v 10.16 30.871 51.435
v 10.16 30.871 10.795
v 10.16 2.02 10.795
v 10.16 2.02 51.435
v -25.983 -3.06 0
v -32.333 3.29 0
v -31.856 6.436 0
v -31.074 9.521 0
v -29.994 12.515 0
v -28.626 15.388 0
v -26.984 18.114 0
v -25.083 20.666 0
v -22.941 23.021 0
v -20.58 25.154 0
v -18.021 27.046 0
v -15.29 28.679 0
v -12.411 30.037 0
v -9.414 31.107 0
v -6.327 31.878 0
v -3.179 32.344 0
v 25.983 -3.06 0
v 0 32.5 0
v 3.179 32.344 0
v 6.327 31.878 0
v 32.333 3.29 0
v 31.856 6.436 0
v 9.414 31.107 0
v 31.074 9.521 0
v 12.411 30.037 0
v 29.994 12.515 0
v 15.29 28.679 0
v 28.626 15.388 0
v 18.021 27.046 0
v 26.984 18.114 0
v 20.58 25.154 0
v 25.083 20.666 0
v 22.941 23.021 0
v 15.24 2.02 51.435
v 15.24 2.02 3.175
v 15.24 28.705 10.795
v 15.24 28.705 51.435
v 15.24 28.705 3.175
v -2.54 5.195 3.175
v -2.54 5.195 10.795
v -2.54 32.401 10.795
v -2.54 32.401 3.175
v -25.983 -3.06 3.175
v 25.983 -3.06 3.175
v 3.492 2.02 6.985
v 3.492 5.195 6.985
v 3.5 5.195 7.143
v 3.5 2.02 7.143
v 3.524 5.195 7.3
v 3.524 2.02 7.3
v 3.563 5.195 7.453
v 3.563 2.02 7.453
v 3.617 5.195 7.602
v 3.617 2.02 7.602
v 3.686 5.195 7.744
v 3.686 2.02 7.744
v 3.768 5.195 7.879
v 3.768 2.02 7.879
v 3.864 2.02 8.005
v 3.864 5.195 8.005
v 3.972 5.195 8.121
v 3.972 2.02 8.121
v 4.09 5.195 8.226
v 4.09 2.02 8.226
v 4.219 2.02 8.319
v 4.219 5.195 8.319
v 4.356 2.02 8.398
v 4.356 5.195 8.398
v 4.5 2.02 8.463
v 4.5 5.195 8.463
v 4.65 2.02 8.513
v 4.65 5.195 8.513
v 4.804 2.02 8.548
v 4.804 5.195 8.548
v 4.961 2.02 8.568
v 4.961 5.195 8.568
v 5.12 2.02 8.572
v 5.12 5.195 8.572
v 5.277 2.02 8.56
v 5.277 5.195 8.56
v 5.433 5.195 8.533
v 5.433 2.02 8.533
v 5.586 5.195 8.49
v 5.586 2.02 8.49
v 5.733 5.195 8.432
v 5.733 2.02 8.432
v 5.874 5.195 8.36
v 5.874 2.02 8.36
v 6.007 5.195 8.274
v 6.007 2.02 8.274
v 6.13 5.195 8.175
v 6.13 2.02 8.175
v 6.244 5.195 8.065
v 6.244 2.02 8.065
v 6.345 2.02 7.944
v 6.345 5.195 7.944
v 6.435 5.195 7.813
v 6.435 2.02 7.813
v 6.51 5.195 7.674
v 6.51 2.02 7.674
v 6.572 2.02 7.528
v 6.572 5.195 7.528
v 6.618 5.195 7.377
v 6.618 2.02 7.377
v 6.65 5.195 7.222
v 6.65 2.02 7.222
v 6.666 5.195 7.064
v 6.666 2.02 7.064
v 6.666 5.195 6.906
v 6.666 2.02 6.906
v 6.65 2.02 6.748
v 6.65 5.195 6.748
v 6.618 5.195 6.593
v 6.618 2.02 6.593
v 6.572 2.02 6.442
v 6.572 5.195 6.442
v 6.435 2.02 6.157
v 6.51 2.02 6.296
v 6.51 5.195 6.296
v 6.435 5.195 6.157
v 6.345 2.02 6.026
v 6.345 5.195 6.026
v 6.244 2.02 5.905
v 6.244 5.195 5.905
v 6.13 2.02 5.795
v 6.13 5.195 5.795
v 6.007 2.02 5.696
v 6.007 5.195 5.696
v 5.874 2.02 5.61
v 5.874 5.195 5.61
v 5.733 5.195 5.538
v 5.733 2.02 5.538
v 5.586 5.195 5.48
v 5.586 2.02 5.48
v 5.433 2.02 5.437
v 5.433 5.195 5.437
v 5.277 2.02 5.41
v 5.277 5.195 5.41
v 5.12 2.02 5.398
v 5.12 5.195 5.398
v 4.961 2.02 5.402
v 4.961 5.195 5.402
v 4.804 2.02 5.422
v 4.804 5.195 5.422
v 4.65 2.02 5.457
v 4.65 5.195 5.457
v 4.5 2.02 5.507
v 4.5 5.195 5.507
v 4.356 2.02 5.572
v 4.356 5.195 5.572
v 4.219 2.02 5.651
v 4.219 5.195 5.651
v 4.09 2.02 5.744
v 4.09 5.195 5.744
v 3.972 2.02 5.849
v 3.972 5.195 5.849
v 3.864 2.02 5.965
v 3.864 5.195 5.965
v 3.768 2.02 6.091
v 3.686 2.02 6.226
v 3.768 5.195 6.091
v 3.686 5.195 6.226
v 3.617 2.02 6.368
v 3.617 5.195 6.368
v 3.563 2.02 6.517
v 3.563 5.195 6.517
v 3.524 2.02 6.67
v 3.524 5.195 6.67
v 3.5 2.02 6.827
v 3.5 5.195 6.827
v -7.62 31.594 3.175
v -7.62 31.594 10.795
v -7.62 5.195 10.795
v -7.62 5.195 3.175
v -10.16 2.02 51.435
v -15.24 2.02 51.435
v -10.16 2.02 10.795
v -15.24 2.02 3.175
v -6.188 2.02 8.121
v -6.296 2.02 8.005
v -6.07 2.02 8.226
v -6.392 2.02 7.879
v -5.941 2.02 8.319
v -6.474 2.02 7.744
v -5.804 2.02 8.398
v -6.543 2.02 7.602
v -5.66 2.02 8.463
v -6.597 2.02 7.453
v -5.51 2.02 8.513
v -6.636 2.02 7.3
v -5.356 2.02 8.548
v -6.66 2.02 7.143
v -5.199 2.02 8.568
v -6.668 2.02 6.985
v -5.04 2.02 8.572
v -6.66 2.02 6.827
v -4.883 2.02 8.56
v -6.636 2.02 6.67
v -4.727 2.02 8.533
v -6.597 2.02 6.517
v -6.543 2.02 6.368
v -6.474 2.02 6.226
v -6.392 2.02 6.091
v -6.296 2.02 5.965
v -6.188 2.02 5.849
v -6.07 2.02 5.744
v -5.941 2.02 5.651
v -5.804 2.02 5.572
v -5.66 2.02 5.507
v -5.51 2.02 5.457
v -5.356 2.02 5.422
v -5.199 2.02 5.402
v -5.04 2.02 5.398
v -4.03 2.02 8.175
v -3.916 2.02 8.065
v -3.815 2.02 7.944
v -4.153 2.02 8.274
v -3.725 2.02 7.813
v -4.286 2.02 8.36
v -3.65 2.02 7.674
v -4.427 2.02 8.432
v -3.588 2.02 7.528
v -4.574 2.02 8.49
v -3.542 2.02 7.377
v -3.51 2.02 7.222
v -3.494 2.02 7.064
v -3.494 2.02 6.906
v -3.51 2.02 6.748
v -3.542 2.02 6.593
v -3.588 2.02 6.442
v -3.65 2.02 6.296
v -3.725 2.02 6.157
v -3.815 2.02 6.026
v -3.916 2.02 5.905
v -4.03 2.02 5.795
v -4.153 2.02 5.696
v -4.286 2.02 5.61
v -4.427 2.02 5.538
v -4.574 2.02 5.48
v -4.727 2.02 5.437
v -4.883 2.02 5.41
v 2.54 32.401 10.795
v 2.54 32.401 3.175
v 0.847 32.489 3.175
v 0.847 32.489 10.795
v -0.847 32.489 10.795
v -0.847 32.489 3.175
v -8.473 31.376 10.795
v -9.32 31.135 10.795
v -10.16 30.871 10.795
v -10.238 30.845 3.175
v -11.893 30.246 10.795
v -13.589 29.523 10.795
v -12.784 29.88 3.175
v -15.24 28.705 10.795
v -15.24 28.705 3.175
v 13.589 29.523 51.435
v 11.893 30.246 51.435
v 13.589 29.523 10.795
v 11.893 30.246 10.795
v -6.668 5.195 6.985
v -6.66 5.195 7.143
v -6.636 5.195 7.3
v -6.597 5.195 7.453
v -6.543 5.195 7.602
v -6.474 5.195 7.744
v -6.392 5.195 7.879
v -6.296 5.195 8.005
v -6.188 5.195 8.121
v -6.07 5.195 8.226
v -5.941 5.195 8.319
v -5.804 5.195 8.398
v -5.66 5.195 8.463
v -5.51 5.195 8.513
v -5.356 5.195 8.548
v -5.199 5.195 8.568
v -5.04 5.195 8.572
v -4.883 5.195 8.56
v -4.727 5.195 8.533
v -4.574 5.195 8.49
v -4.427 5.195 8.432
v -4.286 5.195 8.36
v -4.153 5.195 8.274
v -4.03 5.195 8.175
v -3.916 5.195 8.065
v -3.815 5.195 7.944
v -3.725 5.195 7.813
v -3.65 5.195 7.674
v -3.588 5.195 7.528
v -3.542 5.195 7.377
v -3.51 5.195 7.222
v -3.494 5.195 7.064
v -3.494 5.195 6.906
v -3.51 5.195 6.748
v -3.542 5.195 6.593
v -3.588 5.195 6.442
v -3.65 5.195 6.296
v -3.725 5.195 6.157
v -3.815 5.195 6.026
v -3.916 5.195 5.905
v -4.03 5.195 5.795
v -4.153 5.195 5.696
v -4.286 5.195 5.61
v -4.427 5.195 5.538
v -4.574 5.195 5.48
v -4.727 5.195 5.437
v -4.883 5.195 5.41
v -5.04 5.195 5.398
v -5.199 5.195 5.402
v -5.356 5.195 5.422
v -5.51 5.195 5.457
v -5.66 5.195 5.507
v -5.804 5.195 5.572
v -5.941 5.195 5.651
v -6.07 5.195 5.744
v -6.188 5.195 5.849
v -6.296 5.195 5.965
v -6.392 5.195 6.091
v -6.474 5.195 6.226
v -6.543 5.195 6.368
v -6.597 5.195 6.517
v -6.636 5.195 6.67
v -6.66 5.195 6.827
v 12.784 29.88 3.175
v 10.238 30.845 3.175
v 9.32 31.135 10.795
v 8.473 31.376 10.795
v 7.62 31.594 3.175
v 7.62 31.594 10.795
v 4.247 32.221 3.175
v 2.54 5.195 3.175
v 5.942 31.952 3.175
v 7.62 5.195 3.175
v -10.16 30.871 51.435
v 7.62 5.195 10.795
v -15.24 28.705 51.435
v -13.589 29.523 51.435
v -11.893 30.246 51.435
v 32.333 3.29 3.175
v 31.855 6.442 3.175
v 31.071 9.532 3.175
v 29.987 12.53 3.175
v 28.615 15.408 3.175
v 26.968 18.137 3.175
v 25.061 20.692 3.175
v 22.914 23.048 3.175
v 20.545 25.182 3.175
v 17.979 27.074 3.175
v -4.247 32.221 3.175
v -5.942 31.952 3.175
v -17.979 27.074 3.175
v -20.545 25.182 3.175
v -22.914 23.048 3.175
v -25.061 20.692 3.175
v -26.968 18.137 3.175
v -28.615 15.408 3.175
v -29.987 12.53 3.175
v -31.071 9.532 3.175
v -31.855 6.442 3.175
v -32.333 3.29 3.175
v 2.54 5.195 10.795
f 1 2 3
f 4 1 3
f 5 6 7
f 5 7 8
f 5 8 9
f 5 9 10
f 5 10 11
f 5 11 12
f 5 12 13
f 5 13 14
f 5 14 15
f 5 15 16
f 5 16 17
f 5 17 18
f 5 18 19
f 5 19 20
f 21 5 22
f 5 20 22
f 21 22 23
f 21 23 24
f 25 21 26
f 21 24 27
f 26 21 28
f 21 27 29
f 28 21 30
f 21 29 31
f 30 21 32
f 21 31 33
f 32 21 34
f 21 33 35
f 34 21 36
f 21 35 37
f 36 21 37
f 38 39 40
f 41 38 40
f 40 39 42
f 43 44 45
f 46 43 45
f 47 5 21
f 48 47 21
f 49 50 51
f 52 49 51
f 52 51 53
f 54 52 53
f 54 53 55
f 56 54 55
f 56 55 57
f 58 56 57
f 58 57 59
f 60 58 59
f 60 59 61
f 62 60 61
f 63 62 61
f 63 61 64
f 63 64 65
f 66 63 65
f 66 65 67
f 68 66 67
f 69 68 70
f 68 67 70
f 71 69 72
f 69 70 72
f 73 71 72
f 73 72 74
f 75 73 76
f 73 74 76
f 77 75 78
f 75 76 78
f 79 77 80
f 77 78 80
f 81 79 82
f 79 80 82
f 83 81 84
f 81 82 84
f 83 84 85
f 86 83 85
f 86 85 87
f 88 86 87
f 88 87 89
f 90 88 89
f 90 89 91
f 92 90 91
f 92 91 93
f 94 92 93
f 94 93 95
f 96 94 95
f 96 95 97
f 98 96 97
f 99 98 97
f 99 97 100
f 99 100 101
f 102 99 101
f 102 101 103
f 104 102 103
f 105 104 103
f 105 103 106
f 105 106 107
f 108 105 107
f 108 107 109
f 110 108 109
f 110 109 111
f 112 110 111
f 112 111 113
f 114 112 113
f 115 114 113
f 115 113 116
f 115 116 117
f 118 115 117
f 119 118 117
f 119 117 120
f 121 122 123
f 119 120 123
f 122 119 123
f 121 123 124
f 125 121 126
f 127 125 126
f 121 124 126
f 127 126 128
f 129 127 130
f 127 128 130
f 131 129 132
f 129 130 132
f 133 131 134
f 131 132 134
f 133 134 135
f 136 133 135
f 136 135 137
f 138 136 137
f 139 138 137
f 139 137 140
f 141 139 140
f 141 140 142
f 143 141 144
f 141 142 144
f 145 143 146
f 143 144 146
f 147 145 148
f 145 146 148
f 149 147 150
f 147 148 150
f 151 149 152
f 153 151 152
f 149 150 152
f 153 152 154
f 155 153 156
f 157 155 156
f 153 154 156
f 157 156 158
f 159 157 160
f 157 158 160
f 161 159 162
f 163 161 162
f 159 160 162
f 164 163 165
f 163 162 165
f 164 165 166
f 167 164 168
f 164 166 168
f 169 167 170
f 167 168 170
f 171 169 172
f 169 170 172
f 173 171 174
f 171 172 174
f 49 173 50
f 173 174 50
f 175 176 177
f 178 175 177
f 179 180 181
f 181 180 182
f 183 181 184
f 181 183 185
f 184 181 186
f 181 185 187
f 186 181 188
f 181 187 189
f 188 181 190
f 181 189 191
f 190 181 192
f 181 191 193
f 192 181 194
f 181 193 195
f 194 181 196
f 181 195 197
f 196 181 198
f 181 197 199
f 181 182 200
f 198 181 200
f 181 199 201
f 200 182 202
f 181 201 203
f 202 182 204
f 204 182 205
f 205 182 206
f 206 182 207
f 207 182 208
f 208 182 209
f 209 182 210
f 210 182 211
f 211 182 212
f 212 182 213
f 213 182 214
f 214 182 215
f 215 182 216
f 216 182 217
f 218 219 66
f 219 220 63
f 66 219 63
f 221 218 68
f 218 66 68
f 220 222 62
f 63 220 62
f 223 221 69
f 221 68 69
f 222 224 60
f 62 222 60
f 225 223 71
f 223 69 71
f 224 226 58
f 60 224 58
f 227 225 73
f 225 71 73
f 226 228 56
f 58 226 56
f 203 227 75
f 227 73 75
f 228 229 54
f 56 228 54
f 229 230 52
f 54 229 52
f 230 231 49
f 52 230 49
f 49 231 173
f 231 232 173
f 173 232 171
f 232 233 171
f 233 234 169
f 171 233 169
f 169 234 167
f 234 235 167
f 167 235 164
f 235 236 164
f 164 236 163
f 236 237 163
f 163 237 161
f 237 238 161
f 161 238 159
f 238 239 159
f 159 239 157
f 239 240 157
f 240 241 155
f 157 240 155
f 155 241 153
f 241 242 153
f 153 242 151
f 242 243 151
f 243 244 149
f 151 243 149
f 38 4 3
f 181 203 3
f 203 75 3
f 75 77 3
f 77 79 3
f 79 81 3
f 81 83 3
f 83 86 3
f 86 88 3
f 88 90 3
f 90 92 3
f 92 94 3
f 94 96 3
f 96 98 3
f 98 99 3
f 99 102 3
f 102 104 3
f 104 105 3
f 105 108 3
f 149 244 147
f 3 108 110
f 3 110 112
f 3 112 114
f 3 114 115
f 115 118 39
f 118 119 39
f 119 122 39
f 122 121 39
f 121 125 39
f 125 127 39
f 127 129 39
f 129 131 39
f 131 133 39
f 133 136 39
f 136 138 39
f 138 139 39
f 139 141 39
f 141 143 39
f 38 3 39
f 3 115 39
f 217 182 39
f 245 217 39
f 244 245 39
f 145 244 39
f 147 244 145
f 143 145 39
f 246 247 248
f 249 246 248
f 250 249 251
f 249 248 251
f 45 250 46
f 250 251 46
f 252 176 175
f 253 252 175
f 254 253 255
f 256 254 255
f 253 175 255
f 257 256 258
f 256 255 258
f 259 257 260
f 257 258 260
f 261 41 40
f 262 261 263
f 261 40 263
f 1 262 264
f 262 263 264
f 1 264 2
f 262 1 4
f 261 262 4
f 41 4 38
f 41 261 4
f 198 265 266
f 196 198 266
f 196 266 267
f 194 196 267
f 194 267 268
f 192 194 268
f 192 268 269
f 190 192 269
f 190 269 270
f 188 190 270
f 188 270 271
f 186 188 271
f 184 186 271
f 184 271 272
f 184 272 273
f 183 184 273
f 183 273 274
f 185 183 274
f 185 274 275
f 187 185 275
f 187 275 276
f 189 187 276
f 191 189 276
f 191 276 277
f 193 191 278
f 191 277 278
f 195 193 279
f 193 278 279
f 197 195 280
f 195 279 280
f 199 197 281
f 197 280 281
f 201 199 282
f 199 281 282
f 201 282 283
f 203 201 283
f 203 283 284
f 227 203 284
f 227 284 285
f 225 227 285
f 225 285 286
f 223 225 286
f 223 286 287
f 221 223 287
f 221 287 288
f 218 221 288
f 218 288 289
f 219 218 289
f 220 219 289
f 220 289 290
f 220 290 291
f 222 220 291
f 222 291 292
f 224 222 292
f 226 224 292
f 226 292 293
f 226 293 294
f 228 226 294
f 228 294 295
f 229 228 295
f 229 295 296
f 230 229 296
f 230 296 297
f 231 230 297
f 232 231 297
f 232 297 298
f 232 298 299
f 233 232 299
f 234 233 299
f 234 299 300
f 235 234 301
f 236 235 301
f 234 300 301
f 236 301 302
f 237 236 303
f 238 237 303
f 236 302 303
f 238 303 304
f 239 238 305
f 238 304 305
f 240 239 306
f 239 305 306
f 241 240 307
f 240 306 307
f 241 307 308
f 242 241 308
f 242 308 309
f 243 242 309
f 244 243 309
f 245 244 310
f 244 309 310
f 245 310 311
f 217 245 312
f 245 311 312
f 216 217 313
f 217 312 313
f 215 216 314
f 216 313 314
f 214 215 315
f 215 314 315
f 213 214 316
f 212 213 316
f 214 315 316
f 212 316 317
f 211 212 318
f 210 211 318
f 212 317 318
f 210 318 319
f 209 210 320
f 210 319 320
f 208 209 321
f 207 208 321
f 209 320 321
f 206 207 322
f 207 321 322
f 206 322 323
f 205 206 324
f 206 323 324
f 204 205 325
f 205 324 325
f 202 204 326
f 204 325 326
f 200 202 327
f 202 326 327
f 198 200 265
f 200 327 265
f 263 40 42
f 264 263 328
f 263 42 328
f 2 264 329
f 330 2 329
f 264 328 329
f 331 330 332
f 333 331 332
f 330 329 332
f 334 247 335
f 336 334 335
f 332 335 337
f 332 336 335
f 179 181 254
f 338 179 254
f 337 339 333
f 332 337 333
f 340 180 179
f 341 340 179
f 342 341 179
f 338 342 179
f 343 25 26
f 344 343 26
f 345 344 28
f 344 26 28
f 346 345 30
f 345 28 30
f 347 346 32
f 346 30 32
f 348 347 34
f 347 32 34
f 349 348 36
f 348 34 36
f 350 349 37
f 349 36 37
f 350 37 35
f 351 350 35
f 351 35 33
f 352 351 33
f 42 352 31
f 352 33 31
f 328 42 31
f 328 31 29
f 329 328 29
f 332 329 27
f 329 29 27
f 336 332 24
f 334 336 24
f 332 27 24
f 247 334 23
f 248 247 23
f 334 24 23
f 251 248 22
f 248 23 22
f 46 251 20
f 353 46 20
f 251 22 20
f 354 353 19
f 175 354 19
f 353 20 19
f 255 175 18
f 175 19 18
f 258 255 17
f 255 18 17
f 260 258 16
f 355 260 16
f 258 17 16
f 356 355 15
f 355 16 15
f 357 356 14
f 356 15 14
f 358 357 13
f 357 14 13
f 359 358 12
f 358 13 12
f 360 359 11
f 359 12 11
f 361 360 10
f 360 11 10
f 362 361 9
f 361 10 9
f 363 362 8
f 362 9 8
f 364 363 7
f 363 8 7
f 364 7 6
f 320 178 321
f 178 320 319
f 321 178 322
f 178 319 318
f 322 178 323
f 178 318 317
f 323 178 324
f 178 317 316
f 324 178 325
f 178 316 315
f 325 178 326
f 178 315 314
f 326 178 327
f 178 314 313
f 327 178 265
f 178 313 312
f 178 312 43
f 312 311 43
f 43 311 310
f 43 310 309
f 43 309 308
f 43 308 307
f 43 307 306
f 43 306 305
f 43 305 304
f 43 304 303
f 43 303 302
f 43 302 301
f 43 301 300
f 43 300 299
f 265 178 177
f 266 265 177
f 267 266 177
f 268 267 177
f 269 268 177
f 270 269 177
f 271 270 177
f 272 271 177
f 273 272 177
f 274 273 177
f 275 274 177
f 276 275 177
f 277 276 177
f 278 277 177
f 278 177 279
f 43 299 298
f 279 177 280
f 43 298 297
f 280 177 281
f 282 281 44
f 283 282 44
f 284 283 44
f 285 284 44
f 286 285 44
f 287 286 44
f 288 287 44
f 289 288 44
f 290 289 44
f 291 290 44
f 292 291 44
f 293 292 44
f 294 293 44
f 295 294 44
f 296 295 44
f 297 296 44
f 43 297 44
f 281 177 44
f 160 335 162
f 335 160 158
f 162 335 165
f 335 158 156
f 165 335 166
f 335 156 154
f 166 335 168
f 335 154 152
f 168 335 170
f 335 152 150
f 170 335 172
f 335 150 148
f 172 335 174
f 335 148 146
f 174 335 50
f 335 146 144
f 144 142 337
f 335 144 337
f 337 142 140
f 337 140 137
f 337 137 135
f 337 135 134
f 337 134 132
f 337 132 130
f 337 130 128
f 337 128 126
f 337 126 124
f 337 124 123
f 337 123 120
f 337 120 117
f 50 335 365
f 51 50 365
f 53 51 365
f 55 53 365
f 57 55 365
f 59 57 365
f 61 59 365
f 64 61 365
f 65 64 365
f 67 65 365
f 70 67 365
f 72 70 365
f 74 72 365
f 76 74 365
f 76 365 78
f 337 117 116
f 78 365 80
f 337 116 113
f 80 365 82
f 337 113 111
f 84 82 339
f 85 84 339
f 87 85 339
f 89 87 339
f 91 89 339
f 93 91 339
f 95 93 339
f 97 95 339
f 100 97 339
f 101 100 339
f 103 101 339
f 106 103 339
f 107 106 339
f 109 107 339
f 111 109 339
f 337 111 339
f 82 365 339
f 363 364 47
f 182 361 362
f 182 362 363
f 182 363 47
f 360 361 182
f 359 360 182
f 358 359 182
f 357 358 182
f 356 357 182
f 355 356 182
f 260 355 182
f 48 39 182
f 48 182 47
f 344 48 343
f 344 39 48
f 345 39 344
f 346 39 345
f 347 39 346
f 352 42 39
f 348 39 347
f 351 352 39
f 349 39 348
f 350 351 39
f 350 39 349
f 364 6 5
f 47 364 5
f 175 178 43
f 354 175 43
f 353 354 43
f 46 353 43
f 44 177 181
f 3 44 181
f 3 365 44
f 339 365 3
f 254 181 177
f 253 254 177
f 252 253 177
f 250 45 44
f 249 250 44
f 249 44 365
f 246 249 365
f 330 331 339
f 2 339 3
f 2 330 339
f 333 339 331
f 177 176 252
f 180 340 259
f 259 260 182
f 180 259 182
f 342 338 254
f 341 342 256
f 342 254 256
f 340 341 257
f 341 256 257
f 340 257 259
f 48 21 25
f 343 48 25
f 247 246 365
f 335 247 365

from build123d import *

# Parameters (mm, degrees)
F1_DEPTH  = 3.175
F3_DEPTH  = 7.62
F5_DEPTH  = 7.62
F7_DEPTH  = 40.64
F8_R      = 1.5875
F9_DEPTH  = 25.4
F10_DEPTH = 25.4


with BuildPart() as f1:
    # F0 (on Top) → F1 (new body)
    with BuildSketch(Plane.XY):
        with BuildLine():
            Line((25.9830465623, -3.06), (32.3330465623, 3.29))
            ThreePointArc((32.3330465623, 3.29), (0, 32.5), (-32.3330465623, 3.29))
            Line((-32.3330465623, 3.29), (-25.9830465623, -3.06))
            Line((-25.9830465623, -3.06), (0, -3.06))
            Line((0, -3.06), (25.9830465623, -3.06))
        make_face()
    extrude(amount=F1_DEPTH)

    # F2 (on face) → F3 (join)
    with BuildSketch(Plane.XY.offset(3.175)):
        with BuildLine():
            Line((15.24, 2.02), (15.24, 28.7052678092))
            ThreePointArc((15.24, 28.7052678092), (0, 32.5), (-15.24, 28.7052678092))
            Line((-15.24, 28.7052678092), (-15.24, 2.02))
            Line((-15.24, 2.02), (15.24, 2.02))
        make_face()
    extrude(amount=F3_DEPTH)

    # F4 (on face) → F5 (cut)
    with BuildSketch(Plane.XY.offset(10.795)):
        with BuildLine():
            ThreePointArc((7.62, 31.594075394), (5.0959805235, 32.0979903188), (2.54, 32.4005925872))
            Line((2.54, 32.4005925872), (2.54, 5.195))
            Line((2.54, 5.195), (7.62, 5.195))
            Line((7.62, 5.195), (7.62, 31.594075394))
        make_face()
        with BuildLine():
            Line((-2.54, 5.195), (-2.54, 32.4005925872))
            ThreePointArc((-2.54, 32.4005925872), (-5.0959805235, 32.0979903188), (-7.62, 31.594075394))
            Line((-7.62, 31.594075394), (-7.62, 5.195))
            Line((-7.62, 5.195), (-2.54, 5.195))
        make_face()
    extrude(amount=-F5_DEPTH, mode=Mode.SUBTRACT)

    # F6 (on face) → F7 (join)
    with BuildSketch(Plane.XY.offset(10.795)):
        with BuildLine():
            Line((-10.16, 2.02), (-10.16, 30.8710932751))
            ThreePointArc((-10.16, 30.8710932751), (-12.7460856731, 29.896275688), (-15.24, 28.7052678092))
            Line((-15.24, 28.7052678092), (-15.24, 2.02))
            Line((-15.24, 2.02), (-10.16, 2.02))
        make_face()
        with BuildLine():
            Line((10.16, 30.8710932751), (10.16, 2.02))
            Line((10.16, 2.02), (15.24, 2.02))
            Line((15.24, 2.02), (15.24, 28.7052678092))
            ThreePointArc((15.24, 28.7052678092), (12.7460856731, 29.896275688), (10.16, 30.8710932751))
        make_face()
    extrude(amount=F7_DEPTH)

    # F8 (on face) → F9 (cut)
    with BuildSketch(Plane(origin=(0, 5.195, 0), x_dir=(-1, 0, 0), z_dir=(0, 1, 0))):
        with Locations((-5.08, 6.985)):
            Circle(F8_R)
        with Locations((5.08, 6.985)):
            Circle(F8_R)
    extrude(amount=-F9_DEPTH, mode=Mode.SUBTRACT)

    # F8 (on face) → F10 (cut)
    with BuildSketch(Plane(origin=(0, 5.195, 0), x_dir=(-1, 0, 0), z_dir=(0, 1, 0))):
        with Locations((5.08, 6.985)):
            Circle(F8_R)
    extrude(amount=-F10_DEPTH, mode=Mode.SUBTRACT)


solid = f1.part
